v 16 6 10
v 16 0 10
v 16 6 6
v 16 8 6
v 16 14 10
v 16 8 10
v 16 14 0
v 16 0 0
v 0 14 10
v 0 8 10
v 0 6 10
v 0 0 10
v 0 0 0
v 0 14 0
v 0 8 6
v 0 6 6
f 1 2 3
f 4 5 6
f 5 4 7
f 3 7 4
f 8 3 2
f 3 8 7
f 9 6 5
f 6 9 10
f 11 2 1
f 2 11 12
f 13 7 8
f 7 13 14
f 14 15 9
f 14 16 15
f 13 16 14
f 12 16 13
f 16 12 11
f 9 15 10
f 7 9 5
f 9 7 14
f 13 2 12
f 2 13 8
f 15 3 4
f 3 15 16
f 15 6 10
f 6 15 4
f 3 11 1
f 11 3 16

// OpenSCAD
$fn = 32;

// ----------------------------------------------------------------------
// Micro clip: slotted block, 5-20 mm class
// ----------------------------------------------------------------------

// --- parameters (mm) ---
block_l = 16;             // block length, X
block_w = 14;             // block width, Y
block_h = 10;             // block height, Z
slot_w = 2;               // slot width
slot_d = 4;               // slot depth from the top

difference() {
  cube([block_l, block_w, block_h]);
  translate([-1, block_w / 2 - slot_w / 2, block_h - slot_d])
    cube([block_l + 2, slot_w, slot_d + 1]);
}
